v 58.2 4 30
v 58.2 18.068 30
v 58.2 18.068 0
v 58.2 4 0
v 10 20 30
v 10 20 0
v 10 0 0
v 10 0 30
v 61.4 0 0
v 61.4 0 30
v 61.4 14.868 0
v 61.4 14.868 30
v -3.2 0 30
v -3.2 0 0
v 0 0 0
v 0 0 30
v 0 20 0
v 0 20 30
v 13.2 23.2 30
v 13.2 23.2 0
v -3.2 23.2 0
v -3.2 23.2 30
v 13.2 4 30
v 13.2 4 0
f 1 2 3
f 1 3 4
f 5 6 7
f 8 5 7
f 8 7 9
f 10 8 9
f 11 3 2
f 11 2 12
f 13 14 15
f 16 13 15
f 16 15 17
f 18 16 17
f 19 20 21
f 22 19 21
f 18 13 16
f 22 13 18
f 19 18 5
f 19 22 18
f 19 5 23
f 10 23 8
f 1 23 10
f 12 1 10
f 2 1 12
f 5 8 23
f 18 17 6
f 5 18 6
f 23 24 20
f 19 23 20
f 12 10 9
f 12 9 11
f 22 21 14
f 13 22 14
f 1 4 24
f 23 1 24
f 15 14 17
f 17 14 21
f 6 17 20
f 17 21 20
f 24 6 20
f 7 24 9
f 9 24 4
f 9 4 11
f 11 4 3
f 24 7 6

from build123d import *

# Parameters (mm, degrees)
F1_DEPTH    = 30
F2_T1_DEPTH = 55.7168298797


# Not quite as in the source:
# - a fillet or chamfer that OpenCascade refuses, or shapes differently, is made with other operations: its cross-section is extruded or revolved along the edge and cut away or added


with BuildPart() as f1:
    # F0 (on Top) → F1 (new body)
    with BuildSketch(Plane.XY):
        Polygon((-3.2, 0), (0, 0), (0, 20), (10, 20), (10, 0), (13.2, 0), (58.2, 0), (61.4, 0), (61.4, 19.8679156601), (58.2, 19.8679156601), (58.2, 4.00000019), (13.2, 4.00000019), (13.2, 23.2), (-3.2, 23.2), align=None)
    extrude(amount=F1_DEPTH)

    # F2: chamfer of 5 on 1 edges, made by hand

    # F2_s2 → F2_t1 (cut)
    with BuildSketch(Plane.XY.offset(-12.8584149398)):
        Polygon((56.4, 19.8679156601), (61.4, 14.8679156601), (61.4, 19.8679156601), align=None)
    extrude(amount=F2_T1_DEPTH, mode=Mode.SUBTRACT)


solid = f1.part
